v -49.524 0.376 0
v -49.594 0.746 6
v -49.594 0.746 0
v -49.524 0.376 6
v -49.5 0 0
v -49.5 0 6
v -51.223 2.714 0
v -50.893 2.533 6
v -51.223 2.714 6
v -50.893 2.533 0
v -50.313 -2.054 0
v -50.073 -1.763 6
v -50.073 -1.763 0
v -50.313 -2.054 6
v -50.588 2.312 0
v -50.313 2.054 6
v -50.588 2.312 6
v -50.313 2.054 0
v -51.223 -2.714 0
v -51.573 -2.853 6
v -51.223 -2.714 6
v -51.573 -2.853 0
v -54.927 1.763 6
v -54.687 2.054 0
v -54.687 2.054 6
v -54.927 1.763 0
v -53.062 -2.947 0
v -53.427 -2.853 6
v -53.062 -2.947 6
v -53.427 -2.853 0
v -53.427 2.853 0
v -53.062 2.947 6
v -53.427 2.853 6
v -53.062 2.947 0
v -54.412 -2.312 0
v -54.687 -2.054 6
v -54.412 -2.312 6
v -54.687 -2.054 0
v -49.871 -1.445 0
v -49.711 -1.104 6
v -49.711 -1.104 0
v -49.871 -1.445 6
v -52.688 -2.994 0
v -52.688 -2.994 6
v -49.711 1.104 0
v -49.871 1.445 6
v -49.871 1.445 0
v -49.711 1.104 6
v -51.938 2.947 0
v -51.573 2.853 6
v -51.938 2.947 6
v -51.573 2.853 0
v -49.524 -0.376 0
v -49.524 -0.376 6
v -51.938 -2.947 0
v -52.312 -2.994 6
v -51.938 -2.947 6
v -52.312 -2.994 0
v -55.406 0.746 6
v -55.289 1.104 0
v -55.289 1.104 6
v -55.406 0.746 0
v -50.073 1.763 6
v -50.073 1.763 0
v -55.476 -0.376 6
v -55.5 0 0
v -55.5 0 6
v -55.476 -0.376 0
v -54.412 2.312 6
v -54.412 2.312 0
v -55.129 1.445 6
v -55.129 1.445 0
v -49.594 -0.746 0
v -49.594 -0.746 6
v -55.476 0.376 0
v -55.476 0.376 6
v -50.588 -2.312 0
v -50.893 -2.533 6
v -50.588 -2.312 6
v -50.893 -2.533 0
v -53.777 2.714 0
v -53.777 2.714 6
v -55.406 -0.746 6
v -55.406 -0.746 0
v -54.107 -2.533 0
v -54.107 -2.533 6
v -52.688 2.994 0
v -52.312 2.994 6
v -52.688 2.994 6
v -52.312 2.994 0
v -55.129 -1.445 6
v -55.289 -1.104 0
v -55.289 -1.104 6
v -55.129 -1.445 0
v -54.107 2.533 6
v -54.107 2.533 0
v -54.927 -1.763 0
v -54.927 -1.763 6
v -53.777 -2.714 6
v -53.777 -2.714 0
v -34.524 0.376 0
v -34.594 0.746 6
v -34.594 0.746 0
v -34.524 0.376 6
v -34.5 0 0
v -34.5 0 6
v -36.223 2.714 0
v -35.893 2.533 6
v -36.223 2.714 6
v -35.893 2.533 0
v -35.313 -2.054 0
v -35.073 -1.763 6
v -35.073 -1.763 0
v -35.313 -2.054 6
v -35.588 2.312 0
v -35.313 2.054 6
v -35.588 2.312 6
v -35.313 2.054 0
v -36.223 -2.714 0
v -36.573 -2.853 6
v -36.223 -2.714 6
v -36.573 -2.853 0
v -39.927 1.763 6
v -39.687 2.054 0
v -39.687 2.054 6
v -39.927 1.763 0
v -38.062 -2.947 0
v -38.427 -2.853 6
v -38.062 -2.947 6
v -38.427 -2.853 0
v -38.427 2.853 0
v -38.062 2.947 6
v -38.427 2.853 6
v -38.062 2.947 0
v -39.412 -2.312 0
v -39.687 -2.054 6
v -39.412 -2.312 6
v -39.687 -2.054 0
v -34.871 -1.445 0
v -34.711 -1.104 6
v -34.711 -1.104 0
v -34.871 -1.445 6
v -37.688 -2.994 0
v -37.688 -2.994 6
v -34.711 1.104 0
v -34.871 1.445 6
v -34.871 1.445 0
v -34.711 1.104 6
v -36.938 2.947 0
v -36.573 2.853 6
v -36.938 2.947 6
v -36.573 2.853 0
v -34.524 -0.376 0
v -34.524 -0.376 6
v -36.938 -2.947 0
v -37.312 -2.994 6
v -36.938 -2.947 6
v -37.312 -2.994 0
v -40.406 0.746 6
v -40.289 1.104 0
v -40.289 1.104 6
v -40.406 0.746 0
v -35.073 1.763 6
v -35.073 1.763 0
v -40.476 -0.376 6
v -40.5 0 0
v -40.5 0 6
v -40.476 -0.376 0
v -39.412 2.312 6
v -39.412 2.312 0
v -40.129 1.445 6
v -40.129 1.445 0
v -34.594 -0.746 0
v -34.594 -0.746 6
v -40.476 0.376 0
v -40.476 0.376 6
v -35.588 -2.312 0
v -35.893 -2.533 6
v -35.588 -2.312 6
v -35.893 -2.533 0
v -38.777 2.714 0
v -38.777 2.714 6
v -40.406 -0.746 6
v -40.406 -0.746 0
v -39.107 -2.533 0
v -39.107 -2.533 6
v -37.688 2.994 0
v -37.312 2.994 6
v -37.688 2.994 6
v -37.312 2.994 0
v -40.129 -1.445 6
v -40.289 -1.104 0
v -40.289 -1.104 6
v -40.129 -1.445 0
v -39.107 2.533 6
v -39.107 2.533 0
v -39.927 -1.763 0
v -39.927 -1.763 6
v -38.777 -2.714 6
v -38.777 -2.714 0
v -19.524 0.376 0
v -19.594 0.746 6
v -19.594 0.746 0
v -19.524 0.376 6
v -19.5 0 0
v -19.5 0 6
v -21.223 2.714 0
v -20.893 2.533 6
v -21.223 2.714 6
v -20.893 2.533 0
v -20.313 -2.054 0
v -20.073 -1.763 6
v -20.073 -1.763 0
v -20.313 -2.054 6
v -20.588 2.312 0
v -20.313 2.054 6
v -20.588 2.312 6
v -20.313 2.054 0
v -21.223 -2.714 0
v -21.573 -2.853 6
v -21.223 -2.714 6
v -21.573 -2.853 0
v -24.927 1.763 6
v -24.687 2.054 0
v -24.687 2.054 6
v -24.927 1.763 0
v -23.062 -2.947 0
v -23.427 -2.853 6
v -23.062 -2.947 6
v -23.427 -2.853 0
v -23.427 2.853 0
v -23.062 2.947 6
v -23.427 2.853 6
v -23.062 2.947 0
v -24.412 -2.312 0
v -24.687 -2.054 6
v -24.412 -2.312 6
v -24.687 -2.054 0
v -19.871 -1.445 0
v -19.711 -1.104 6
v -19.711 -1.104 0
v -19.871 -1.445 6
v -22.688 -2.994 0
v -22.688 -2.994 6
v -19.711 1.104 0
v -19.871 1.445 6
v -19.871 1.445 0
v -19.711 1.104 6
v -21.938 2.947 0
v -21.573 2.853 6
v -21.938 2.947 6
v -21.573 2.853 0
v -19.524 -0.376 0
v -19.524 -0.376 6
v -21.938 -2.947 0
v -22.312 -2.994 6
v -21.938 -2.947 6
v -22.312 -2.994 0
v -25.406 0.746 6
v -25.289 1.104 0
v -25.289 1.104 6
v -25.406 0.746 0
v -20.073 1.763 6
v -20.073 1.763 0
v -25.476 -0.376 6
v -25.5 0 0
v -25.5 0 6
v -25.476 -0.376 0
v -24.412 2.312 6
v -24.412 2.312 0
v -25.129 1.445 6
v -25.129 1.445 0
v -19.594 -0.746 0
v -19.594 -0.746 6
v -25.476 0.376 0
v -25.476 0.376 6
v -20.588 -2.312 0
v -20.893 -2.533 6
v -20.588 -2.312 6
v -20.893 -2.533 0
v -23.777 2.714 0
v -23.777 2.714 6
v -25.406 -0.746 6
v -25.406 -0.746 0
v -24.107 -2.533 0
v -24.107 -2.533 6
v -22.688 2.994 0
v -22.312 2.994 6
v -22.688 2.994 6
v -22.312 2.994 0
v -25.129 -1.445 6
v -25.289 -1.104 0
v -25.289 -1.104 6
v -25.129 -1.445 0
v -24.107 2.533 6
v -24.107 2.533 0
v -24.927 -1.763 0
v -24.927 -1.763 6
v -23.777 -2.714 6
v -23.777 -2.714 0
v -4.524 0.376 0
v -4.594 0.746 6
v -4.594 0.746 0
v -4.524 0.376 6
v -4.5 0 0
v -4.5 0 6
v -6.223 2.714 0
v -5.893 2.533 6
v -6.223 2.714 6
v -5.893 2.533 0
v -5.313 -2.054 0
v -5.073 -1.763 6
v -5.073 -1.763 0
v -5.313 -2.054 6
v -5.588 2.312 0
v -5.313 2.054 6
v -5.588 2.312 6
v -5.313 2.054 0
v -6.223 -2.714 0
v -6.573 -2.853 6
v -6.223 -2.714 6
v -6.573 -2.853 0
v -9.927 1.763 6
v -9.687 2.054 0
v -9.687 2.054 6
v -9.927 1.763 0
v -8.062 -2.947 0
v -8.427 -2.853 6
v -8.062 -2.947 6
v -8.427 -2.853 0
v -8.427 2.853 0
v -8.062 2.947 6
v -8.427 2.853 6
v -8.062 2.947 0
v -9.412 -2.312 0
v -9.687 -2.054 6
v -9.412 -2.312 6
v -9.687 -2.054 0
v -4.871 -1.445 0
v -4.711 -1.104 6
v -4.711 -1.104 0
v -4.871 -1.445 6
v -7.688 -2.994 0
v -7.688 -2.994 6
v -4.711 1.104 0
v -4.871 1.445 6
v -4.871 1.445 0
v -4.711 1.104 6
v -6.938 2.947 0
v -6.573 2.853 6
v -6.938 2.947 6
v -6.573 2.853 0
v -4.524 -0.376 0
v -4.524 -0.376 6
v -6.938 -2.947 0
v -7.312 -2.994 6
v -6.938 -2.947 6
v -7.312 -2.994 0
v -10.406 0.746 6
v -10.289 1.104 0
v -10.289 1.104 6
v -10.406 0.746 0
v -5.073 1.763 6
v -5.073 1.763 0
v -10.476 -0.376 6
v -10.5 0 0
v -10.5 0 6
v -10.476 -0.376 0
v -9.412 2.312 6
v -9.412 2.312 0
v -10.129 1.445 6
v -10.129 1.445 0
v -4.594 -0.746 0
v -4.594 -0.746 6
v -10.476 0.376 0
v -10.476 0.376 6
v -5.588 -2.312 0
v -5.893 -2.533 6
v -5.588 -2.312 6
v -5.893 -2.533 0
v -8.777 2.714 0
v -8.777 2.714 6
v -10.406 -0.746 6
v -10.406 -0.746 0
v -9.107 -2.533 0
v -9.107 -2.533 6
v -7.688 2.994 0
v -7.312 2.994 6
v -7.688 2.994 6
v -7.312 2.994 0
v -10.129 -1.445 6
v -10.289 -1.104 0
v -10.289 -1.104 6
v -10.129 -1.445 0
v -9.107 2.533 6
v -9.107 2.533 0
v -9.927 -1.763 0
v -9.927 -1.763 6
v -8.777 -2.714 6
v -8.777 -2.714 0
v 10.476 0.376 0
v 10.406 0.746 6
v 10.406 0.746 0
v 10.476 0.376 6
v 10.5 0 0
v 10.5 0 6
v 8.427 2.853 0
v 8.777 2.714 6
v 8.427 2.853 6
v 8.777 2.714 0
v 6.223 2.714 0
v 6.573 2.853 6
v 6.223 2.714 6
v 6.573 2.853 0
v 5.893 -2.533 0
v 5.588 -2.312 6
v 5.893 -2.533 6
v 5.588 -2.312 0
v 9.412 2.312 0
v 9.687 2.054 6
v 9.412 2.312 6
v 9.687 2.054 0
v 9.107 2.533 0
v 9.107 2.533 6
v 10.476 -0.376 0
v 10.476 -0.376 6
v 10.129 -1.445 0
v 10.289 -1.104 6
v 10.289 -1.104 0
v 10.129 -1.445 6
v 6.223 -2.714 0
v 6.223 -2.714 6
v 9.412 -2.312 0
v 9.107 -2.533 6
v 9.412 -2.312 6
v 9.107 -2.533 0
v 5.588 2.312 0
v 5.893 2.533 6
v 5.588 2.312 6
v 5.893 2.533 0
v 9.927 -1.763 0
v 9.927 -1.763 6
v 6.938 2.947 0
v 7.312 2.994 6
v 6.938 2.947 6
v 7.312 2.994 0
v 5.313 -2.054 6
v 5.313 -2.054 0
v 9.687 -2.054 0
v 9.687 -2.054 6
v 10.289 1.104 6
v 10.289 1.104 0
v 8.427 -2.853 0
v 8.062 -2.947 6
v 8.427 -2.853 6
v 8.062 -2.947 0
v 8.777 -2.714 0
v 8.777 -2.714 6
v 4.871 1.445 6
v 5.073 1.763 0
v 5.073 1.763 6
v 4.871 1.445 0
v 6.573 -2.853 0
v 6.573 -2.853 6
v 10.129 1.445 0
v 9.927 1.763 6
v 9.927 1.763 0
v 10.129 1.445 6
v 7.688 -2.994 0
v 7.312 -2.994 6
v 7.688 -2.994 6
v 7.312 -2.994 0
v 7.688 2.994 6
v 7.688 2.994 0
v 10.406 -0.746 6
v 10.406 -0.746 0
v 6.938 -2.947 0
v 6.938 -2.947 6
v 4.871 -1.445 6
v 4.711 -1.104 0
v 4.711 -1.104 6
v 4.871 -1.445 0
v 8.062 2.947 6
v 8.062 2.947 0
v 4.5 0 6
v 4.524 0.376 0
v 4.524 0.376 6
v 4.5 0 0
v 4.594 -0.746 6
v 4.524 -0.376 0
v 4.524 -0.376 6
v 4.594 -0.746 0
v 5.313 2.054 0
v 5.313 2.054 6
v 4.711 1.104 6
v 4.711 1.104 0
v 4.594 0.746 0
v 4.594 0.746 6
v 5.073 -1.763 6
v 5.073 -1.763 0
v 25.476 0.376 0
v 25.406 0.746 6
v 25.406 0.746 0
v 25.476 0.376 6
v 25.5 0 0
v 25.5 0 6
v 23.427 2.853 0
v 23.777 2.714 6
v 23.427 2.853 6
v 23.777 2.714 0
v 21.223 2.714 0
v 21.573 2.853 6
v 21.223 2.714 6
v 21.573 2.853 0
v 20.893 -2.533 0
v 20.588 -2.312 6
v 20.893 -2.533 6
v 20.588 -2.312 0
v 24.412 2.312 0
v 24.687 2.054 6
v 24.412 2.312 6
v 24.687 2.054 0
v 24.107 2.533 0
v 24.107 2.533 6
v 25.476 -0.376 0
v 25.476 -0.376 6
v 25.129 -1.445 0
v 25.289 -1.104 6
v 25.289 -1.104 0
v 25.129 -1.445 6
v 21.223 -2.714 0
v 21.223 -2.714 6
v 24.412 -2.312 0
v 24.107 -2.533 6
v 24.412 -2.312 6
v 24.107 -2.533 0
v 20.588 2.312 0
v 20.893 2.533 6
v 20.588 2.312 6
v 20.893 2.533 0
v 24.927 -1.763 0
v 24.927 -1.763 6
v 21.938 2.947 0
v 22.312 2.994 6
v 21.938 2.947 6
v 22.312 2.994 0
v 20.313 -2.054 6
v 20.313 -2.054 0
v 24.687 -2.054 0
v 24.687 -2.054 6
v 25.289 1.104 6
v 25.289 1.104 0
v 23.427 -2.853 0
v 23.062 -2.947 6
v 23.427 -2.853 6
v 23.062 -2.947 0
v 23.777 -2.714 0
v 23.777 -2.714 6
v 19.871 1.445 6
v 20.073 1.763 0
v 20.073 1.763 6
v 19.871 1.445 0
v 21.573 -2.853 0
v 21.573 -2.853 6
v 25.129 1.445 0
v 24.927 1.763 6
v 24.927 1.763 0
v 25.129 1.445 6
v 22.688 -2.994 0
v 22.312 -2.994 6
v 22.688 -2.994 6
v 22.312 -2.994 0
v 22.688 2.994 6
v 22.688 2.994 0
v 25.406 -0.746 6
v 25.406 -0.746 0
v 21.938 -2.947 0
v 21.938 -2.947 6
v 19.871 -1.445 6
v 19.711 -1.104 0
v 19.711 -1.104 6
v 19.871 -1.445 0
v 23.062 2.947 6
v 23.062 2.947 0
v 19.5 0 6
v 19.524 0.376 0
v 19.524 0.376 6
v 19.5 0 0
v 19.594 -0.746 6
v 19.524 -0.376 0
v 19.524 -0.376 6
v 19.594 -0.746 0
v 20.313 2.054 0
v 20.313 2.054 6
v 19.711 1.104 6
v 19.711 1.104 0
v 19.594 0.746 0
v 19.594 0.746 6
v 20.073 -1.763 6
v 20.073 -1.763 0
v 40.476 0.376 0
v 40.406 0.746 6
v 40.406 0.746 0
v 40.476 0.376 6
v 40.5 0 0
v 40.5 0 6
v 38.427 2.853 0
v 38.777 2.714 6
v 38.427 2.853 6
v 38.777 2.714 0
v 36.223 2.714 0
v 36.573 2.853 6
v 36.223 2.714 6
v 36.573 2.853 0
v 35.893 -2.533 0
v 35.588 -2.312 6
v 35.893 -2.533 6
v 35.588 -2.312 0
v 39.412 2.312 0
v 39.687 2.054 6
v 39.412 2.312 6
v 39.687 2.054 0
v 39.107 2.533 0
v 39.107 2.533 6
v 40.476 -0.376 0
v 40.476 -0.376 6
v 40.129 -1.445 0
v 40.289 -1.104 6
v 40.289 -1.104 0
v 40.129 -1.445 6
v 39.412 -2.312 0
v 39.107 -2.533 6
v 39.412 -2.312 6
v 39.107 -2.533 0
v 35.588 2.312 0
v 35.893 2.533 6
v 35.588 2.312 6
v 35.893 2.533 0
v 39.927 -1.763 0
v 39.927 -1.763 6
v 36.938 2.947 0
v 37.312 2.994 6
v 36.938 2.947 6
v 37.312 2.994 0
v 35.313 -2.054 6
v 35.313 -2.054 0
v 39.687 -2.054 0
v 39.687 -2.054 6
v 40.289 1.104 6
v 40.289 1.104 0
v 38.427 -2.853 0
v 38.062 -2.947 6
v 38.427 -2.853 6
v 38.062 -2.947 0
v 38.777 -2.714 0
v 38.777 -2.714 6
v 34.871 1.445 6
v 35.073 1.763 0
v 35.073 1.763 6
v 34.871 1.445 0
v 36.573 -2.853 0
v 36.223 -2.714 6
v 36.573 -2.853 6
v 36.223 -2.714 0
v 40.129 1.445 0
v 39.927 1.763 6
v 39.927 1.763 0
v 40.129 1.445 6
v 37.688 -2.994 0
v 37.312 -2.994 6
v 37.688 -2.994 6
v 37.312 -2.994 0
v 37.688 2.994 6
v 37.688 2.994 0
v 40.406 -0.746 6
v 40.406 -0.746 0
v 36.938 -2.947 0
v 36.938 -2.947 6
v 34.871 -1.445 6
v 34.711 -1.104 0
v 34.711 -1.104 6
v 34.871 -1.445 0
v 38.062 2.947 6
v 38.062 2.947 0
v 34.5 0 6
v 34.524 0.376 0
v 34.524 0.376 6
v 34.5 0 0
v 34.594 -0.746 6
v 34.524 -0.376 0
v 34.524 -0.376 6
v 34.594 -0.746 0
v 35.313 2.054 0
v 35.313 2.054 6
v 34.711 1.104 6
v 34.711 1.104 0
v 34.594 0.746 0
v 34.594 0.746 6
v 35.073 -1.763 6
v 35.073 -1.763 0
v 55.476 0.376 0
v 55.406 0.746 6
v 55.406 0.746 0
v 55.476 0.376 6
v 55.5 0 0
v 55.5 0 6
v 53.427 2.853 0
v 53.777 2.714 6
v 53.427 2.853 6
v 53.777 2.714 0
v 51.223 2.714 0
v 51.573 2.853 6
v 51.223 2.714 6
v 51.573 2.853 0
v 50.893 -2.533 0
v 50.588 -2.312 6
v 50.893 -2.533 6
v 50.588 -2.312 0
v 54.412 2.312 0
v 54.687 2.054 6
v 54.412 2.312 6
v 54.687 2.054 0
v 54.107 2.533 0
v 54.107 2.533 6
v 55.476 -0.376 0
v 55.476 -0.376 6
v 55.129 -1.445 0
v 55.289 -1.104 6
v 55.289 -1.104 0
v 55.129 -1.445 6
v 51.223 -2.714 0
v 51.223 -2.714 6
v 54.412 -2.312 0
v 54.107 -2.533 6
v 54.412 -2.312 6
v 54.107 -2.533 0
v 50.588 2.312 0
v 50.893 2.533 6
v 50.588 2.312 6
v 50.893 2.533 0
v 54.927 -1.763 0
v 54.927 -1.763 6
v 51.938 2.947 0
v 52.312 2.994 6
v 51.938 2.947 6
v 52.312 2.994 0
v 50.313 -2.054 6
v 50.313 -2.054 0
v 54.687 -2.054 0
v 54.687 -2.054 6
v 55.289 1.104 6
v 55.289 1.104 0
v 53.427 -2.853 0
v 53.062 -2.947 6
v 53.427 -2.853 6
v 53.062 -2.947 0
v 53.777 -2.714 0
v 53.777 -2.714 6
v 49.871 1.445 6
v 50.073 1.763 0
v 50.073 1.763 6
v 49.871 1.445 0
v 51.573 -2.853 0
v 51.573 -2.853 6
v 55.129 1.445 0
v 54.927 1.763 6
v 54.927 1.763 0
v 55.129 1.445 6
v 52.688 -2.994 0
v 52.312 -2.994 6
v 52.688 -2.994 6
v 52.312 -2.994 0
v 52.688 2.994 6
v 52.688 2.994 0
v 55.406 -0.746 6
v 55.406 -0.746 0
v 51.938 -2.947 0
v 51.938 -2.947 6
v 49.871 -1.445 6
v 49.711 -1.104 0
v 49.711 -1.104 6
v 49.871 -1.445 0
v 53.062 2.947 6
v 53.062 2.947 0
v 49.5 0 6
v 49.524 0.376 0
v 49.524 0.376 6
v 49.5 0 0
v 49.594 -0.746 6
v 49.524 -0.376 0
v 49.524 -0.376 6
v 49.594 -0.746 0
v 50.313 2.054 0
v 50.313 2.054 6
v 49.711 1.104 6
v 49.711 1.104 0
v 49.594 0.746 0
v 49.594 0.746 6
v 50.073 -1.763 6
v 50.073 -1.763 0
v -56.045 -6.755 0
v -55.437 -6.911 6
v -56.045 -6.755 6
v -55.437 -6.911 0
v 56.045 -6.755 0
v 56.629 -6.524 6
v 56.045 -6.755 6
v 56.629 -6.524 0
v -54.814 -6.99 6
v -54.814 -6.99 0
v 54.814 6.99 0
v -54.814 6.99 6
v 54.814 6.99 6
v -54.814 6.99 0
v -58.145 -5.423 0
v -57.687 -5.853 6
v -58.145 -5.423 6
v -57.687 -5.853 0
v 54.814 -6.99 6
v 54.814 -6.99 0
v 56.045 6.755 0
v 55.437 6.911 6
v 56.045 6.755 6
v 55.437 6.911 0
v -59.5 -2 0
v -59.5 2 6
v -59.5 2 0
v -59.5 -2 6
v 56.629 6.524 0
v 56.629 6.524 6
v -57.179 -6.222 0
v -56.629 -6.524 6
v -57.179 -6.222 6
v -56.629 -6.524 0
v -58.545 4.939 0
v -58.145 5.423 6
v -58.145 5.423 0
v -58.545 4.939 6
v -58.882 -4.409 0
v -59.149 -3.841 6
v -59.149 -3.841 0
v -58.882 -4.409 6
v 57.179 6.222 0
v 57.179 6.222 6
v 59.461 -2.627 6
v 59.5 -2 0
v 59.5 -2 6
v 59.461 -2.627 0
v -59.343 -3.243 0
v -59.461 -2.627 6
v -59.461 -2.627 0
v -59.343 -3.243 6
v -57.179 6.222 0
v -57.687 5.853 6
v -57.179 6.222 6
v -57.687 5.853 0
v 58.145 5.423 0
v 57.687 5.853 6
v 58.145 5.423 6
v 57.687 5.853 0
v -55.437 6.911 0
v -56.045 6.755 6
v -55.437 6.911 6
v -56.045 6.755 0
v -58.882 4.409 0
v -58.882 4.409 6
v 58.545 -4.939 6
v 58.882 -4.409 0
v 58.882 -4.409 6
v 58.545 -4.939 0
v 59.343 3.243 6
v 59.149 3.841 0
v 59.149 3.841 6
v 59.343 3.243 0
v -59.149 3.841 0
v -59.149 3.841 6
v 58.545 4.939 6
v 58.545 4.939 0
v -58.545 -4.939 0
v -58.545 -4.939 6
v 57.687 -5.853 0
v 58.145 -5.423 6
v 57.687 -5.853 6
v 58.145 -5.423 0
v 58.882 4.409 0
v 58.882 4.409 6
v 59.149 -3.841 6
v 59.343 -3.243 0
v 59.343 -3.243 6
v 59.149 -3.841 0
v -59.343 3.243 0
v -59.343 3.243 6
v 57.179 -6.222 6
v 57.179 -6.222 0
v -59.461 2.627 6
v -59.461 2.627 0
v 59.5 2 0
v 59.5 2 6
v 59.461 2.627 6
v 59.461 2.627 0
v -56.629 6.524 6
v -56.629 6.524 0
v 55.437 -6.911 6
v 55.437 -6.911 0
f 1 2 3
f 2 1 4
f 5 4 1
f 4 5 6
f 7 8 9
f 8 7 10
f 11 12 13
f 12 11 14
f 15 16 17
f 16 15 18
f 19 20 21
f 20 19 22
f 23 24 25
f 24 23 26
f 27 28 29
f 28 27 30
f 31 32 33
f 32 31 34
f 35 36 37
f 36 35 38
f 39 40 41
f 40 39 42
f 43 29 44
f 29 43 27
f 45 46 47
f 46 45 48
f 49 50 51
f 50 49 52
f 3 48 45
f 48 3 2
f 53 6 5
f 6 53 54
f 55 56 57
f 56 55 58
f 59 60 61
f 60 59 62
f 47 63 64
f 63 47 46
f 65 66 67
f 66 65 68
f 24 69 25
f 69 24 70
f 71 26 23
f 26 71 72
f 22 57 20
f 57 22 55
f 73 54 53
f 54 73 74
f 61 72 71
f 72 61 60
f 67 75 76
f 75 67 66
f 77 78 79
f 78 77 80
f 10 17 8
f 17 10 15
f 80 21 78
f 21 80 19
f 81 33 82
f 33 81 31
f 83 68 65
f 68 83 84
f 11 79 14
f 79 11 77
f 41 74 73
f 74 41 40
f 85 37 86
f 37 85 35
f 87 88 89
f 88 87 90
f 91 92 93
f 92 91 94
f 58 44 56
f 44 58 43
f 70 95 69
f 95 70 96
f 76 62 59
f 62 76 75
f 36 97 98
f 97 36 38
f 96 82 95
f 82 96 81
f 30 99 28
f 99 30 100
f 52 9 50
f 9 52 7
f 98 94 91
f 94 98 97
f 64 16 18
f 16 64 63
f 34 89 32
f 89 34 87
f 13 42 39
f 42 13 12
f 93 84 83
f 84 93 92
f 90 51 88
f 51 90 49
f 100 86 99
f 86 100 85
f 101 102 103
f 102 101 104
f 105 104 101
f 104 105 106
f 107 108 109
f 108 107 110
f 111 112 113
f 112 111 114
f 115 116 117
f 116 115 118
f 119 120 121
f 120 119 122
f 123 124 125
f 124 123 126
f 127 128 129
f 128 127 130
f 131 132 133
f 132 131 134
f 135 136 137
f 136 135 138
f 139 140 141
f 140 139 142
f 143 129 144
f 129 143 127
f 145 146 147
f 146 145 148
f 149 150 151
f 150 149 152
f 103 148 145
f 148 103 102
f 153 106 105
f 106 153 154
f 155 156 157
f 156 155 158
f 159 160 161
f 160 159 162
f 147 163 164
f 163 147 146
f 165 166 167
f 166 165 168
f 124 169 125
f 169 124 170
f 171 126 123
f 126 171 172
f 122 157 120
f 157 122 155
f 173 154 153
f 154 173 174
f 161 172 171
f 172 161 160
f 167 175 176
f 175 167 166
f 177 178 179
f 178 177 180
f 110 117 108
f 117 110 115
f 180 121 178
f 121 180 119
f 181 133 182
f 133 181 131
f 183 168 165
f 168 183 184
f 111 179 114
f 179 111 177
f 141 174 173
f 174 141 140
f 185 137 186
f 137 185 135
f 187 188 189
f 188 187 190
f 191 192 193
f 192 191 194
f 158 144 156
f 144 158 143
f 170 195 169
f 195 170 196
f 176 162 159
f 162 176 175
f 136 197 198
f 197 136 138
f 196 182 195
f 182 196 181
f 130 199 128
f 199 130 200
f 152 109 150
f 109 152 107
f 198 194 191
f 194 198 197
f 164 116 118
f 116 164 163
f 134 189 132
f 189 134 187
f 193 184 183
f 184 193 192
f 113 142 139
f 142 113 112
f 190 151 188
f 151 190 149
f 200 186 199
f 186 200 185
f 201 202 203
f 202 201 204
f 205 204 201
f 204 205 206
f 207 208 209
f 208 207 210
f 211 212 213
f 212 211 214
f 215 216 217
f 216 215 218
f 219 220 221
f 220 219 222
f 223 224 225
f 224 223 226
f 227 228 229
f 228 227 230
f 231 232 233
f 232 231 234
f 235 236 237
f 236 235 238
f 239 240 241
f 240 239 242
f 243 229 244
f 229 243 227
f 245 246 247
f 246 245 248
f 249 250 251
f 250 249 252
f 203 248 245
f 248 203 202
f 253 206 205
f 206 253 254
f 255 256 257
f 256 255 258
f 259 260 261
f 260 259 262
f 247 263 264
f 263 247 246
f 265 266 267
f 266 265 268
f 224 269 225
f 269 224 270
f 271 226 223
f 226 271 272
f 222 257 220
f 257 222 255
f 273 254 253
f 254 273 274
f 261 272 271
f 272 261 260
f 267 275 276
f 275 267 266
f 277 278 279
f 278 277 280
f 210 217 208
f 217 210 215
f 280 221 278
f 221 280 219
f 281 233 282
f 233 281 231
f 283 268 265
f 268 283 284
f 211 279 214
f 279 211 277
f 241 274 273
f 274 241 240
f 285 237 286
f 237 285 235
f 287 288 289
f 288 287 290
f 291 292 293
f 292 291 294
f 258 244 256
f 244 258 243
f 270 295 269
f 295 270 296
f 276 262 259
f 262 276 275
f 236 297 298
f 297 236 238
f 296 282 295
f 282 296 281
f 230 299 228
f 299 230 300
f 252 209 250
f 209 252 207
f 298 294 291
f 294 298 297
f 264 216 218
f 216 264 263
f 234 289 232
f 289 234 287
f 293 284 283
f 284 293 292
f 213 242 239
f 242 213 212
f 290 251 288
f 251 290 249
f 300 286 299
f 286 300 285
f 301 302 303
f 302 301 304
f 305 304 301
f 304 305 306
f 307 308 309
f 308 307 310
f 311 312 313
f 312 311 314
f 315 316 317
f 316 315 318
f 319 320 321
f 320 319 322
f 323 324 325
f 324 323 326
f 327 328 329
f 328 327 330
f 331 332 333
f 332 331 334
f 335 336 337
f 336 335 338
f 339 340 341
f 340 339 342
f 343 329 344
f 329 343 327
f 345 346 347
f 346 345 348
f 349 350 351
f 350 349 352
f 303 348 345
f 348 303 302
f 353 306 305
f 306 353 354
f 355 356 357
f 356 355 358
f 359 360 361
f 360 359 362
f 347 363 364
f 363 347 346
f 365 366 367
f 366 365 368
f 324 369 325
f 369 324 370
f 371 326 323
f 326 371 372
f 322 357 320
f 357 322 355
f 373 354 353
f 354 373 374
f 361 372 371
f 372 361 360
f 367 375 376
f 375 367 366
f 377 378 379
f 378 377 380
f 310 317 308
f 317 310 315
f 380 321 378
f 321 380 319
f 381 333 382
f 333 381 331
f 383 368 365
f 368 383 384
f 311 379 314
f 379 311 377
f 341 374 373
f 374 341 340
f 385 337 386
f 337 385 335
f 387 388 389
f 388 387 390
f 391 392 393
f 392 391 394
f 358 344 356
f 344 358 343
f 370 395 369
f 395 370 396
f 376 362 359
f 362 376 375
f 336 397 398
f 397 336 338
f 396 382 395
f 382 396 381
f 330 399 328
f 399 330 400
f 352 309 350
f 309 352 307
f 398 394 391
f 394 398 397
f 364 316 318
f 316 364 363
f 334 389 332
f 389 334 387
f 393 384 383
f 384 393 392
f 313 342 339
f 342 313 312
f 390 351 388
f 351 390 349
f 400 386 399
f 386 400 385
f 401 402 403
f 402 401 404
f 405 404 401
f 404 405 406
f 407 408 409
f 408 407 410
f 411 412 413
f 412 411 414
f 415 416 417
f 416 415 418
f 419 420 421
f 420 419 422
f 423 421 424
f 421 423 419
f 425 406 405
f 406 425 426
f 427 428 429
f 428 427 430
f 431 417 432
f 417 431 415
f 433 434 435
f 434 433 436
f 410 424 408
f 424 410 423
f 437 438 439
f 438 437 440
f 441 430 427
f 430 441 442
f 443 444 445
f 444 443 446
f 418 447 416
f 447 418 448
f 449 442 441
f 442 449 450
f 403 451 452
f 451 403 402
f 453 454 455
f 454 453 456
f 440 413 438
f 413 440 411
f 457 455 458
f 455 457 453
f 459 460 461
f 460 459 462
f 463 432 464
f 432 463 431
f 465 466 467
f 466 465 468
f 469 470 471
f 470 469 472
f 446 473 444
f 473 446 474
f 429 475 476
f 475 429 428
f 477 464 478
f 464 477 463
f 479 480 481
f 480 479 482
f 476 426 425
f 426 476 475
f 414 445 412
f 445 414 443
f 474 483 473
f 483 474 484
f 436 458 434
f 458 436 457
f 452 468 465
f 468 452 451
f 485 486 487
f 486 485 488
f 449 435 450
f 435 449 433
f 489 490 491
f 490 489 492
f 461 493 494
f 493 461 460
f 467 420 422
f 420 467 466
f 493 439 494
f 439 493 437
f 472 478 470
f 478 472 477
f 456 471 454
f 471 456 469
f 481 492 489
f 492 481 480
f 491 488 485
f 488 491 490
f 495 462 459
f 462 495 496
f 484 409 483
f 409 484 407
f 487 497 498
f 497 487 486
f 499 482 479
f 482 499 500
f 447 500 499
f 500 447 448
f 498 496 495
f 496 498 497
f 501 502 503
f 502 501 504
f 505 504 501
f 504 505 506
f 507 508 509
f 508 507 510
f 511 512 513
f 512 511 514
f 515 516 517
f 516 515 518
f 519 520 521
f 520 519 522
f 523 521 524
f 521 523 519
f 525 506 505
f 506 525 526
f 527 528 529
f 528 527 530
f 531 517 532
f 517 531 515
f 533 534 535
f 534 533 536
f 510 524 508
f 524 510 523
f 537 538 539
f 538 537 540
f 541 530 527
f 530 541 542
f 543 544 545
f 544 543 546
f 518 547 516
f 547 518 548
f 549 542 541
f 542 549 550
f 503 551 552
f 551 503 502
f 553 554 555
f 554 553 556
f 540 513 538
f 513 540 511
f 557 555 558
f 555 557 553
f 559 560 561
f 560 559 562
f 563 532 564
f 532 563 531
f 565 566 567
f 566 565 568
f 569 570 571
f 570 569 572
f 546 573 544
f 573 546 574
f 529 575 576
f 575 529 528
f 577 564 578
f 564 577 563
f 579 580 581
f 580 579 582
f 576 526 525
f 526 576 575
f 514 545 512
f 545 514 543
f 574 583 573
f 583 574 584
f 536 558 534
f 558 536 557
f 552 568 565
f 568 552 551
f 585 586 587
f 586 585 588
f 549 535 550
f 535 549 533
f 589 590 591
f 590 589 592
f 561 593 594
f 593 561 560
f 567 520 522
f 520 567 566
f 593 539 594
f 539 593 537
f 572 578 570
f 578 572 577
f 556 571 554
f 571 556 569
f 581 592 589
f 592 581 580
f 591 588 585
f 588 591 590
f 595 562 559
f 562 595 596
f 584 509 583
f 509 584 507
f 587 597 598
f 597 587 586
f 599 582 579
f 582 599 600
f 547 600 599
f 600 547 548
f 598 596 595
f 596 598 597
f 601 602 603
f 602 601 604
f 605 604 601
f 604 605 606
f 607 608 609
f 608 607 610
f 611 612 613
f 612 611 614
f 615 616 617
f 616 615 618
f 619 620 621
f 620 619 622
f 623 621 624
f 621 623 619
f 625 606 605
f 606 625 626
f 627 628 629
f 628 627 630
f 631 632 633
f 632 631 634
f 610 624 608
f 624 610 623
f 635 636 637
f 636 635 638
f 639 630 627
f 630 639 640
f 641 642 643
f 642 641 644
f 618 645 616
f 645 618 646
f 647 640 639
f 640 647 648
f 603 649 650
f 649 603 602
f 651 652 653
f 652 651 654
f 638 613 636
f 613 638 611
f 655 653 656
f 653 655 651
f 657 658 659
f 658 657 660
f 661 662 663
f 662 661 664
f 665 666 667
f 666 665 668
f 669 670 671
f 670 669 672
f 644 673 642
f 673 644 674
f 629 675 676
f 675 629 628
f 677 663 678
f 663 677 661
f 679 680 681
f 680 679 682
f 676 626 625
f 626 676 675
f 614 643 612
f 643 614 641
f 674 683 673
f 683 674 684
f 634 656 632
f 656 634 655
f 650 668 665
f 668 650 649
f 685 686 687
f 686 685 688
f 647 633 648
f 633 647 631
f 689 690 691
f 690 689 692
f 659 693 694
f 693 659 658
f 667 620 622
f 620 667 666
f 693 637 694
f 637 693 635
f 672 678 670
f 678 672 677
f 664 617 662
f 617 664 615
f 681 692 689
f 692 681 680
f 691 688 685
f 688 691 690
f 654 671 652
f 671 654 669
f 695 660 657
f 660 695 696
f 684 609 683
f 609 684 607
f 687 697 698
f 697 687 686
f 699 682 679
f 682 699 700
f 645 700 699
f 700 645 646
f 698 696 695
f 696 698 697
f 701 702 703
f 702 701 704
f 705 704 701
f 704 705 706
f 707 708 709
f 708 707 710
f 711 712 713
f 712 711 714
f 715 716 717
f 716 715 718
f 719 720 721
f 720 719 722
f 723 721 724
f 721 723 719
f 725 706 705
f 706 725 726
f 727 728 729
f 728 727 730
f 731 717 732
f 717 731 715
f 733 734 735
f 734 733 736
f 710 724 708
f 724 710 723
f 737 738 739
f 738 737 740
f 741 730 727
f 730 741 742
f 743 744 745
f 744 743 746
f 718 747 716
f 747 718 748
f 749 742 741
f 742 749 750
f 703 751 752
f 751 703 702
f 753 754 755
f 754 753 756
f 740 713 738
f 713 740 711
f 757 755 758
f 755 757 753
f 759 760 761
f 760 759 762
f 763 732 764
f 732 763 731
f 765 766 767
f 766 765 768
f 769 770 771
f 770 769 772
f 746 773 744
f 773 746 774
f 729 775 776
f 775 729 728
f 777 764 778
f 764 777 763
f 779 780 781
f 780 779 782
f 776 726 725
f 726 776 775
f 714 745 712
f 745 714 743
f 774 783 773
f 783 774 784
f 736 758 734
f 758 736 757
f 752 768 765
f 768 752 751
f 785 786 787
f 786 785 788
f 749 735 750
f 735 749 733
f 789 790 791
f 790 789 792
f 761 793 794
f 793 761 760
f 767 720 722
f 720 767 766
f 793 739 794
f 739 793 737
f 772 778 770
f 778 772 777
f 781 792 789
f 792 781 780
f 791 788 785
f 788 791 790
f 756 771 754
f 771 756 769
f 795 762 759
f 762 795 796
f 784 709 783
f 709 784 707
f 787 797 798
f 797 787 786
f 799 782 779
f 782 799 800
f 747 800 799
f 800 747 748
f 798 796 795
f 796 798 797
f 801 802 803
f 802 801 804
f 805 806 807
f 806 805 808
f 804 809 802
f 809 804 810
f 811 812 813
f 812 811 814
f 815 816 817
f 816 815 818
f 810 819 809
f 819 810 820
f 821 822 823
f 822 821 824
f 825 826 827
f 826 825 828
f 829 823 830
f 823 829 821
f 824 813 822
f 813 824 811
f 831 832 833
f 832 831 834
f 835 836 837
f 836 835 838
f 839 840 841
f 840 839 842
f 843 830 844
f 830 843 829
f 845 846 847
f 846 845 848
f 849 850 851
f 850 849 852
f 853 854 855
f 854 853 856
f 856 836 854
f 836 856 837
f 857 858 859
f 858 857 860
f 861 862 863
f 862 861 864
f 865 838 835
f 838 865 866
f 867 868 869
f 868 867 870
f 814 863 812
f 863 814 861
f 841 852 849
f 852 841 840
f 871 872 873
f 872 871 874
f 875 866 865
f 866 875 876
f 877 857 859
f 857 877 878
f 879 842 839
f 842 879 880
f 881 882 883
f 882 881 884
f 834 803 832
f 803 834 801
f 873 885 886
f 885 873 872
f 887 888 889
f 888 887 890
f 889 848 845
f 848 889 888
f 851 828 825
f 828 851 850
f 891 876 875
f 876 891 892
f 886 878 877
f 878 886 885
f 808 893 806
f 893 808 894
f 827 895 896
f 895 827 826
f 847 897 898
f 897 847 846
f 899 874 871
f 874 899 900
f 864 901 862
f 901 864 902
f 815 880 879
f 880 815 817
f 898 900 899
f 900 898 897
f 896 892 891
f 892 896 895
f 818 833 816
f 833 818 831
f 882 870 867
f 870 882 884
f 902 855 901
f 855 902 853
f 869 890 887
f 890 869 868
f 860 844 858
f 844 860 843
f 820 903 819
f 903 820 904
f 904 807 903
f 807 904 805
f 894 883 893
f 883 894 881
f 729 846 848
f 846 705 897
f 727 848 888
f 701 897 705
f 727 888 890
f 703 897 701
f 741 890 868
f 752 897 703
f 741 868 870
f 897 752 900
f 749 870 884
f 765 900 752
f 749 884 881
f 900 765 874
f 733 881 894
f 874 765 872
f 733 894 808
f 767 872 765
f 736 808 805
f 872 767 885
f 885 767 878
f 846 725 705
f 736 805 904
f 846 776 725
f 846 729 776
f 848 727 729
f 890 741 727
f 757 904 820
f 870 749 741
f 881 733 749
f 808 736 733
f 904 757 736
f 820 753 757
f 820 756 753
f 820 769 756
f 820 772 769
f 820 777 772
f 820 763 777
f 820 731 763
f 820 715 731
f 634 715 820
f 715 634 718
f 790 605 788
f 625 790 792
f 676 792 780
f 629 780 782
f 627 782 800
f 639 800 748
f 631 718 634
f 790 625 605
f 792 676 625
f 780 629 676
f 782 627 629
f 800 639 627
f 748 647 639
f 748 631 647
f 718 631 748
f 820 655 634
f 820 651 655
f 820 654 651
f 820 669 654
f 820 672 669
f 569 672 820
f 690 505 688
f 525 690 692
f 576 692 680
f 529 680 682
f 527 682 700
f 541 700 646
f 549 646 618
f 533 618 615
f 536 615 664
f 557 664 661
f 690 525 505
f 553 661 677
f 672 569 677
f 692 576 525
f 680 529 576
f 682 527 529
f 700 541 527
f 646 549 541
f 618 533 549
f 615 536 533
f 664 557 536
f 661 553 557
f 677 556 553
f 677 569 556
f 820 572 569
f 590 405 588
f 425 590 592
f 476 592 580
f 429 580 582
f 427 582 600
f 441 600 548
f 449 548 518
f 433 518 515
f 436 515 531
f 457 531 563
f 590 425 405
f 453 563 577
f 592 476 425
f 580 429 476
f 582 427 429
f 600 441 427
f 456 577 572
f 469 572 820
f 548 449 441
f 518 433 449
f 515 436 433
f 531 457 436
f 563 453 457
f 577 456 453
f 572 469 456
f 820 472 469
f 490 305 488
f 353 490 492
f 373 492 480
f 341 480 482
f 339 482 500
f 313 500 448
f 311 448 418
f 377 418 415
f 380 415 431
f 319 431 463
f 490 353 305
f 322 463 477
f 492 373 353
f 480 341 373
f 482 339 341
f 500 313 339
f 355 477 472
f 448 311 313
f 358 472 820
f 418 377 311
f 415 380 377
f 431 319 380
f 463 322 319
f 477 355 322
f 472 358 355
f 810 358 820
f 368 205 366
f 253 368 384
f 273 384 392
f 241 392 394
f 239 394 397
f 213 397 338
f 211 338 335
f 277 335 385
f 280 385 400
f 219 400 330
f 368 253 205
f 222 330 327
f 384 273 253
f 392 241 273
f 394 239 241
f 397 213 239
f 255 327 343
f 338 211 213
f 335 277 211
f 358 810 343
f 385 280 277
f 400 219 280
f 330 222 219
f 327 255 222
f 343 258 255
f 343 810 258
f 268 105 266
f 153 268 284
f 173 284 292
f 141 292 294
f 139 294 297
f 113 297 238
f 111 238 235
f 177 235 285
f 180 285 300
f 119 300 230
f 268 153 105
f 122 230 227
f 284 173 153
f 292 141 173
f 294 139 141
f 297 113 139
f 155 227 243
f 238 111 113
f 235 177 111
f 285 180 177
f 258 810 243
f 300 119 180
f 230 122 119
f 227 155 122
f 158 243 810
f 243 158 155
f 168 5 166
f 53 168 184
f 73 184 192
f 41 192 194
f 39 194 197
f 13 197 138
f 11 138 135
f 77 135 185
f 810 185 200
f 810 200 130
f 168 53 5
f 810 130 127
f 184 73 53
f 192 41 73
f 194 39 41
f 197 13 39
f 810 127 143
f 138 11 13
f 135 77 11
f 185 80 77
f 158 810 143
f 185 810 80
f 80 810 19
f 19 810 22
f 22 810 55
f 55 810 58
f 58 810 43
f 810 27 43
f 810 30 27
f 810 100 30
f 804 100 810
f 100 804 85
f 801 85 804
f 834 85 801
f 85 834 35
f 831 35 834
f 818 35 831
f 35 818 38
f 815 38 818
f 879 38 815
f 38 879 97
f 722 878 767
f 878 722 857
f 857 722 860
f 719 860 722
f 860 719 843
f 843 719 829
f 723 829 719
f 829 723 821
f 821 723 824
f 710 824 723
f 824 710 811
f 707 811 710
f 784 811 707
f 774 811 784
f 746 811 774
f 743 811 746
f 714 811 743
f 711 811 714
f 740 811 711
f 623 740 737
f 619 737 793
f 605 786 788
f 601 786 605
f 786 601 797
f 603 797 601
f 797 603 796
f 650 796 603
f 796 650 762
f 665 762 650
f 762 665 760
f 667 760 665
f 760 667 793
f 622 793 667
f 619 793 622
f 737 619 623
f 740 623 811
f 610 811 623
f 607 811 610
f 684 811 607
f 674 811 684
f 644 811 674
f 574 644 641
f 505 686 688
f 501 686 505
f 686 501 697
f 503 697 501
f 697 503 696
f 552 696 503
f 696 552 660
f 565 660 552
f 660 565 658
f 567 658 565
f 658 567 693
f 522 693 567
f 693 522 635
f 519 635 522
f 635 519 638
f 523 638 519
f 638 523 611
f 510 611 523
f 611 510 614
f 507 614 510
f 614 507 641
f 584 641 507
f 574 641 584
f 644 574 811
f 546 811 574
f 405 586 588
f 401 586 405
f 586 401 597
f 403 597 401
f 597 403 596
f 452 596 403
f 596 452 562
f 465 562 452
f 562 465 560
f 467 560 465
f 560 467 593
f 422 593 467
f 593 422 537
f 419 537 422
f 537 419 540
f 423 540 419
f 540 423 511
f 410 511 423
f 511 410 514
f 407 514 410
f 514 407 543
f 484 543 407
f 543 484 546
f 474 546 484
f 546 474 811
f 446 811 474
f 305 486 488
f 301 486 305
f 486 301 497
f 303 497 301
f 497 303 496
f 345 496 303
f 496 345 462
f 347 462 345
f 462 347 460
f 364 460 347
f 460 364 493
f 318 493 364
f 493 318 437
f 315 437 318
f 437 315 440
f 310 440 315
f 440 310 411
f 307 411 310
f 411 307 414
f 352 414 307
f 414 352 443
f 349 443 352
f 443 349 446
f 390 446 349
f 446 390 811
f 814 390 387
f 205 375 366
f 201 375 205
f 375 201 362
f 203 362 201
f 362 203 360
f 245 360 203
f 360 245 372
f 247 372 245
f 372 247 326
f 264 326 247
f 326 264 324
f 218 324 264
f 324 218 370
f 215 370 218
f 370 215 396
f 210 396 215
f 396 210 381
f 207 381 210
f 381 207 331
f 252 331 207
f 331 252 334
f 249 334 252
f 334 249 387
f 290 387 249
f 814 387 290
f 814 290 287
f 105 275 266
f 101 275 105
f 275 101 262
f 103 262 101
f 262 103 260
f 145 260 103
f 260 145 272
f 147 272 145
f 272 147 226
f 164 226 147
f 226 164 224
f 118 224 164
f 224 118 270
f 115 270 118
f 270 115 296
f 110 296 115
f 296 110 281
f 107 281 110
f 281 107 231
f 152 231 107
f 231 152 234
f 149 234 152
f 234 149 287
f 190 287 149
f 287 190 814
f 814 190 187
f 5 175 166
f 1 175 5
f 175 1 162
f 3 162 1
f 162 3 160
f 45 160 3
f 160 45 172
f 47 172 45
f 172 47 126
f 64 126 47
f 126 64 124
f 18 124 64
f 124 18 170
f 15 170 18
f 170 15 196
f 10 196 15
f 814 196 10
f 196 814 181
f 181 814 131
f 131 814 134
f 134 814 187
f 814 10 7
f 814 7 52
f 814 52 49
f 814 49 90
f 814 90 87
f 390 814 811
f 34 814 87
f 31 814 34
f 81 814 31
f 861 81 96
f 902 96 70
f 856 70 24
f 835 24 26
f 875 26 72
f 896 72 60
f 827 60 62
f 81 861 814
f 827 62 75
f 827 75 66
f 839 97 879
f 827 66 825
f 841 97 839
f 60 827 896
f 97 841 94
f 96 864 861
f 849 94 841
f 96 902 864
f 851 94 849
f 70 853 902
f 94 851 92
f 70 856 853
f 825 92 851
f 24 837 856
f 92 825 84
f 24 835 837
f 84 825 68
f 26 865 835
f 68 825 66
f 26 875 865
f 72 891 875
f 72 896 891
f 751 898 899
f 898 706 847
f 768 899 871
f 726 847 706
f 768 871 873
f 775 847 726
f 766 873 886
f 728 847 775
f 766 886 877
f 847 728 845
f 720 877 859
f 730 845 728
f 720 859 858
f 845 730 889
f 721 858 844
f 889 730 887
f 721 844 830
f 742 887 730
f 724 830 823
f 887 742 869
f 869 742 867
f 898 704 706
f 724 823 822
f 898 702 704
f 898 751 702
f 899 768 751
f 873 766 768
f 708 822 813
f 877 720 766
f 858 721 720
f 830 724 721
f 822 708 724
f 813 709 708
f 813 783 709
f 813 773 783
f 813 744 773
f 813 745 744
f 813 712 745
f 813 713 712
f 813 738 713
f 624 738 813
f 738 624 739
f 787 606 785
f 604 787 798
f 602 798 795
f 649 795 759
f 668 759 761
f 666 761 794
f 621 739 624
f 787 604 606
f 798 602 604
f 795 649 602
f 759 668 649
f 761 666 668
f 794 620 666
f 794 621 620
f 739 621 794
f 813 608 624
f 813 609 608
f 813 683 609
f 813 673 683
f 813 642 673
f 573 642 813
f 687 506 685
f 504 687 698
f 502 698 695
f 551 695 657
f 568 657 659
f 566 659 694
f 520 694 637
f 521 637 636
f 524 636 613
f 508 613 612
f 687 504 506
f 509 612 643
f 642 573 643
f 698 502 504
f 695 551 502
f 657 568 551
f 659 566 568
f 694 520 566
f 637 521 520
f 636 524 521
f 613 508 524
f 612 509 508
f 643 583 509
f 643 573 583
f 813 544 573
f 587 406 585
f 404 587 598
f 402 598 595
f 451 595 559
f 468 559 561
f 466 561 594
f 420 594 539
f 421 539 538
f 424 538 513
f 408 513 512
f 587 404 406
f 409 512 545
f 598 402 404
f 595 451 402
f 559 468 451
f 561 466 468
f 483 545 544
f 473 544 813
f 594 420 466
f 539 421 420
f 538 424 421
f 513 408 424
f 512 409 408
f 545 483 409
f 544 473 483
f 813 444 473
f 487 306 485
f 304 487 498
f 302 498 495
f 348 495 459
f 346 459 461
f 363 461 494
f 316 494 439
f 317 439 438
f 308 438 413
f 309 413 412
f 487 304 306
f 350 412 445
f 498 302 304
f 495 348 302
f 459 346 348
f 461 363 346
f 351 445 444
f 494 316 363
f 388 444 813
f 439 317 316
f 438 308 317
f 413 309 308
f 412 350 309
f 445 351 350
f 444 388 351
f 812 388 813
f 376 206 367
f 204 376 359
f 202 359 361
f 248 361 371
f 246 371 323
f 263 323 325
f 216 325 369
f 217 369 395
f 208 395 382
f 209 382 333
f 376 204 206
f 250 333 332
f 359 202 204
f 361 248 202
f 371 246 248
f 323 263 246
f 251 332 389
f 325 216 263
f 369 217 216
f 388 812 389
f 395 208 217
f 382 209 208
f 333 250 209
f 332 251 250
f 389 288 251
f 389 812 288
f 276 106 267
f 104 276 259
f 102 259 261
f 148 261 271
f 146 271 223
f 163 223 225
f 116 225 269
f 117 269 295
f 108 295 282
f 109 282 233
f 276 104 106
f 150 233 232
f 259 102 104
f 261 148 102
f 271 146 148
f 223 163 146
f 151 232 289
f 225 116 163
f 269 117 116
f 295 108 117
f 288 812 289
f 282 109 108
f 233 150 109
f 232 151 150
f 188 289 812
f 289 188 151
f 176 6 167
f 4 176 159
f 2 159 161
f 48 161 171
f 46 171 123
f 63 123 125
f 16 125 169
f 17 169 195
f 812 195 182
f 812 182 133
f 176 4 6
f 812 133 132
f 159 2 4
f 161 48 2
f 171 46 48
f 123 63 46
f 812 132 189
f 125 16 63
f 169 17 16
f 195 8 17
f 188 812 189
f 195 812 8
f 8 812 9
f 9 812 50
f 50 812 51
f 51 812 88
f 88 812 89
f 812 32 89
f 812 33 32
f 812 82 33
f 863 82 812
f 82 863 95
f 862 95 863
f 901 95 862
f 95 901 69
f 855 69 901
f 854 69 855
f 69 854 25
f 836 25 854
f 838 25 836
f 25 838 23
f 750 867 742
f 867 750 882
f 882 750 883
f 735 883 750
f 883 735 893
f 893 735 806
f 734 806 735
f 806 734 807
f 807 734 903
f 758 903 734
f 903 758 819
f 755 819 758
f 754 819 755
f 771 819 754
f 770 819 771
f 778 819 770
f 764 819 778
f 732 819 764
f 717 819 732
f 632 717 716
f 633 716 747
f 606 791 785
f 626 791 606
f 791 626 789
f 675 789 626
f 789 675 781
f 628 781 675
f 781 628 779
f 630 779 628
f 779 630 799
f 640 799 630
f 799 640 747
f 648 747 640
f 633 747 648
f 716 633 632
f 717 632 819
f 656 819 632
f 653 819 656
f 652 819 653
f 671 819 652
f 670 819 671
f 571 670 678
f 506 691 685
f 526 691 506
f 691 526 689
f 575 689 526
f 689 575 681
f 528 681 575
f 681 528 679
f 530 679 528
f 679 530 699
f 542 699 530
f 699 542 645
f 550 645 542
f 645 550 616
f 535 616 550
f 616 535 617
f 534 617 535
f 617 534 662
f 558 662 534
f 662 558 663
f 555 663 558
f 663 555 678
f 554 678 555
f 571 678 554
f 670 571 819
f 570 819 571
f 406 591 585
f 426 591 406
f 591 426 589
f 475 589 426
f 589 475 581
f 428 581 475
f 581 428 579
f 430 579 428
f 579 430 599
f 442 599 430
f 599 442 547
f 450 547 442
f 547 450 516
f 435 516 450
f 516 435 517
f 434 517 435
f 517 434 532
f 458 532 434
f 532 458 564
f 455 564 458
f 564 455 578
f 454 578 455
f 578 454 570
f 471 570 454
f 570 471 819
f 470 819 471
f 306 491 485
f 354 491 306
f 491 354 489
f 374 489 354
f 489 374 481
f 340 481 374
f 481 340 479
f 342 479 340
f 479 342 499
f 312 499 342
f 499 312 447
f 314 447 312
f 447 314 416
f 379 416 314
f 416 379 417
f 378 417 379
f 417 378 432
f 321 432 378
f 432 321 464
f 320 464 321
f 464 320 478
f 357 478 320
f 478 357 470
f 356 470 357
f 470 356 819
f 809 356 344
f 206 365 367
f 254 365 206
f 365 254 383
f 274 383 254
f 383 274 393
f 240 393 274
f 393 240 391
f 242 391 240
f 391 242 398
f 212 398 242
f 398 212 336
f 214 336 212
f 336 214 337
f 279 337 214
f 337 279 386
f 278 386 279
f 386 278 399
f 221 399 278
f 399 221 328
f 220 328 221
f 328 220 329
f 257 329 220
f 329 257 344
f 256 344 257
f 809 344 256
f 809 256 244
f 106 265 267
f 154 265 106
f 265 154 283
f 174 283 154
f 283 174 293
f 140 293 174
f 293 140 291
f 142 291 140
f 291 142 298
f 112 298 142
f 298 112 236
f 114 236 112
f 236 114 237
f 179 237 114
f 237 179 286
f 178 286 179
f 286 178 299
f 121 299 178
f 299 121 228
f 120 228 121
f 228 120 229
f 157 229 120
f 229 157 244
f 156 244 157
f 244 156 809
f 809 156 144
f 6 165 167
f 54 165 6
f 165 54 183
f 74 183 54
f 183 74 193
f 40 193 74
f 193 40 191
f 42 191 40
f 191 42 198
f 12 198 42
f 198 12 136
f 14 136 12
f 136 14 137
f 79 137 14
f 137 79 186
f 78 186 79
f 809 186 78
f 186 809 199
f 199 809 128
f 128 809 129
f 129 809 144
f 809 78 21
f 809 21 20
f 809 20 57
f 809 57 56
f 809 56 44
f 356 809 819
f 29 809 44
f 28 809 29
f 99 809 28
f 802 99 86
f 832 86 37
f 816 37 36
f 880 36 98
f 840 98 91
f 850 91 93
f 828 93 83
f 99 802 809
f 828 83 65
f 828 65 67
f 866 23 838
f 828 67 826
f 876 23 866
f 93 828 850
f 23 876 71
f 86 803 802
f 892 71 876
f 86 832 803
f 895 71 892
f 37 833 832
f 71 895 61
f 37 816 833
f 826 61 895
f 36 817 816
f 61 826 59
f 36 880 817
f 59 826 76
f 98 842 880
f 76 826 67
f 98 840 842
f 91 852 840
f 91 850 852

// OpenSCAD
$fn = 50;


difference() {
	union() {
		hull() {
			translate(v = [-54.5000000000, 2.0000000000, 0]) {
				cylinder(h = 6, r = 5);
			}
			translate(v = [54.5000000000, 2.0000000000, 0]) {
				cylinder(h = 6, r = 5);
			}
			translate(v = [-54.5000000000, -2.0000000000, 0]) {
				cylinder(h = 6, r = 5);
			}
			translate(v = [54.5000000000, -2.0000000000, 0]) {
				cylinder(h = 6, r = 5);
			}
		}
	}
	union() {
		translate(v = [-52.5000000000, 0.0000000000, 0]) {
			translate(v = [0, 0, -100]) {
				cylinder(h = 200, r = 3.0000000000);
			}
		}
		translate(v = [-37.5000000000, 0.0000000000, 0]) {
			translate(v = [0, 0, -100]) {
				cylinder(h = 200, r = 3.0000000000);
			}
		}
		translate(v = [-22.5000000000, 0.0000000000, 0]) {
			translate(v = [0, 0, -100]) {
				cylinder(h = 200, r = 3.0000000000);
			}
		}
		translate(v = [-7.5000000000, 0.0000000000, 0]) {
			translate(v = [0, 0, -100]) {
				cylinder(h = 200, r = 3.0000000000);
			}
		}
		translate(v = [7.5000000000, 0.0000000000, 0]) {
			translate(v = [0, 0, -100]) {
				cylinder(h = 200, r = 3.0000000000);
			}
		}
		translate(v = [22.5000000000, 0.0000000000, 0]) {
			translate(v = [0, 0, -100]) {
				cylinder(h = 200, r = 3.0000000000);
			}
		}
		translate(v = [37.5000000000, 0.0000000000, 0]) {
			translate(v = [0, 0, -100]) {
				cylinder(h = 200, r = 3.0000000000);
			}
		}
		translate(v = [52.5000000000, 0.0000000000, 0]) {
			translate(v = [0, 0, -100]) {
				cylinder(h = 200, r = 3.0000000000);
			}
		}
	}
}
